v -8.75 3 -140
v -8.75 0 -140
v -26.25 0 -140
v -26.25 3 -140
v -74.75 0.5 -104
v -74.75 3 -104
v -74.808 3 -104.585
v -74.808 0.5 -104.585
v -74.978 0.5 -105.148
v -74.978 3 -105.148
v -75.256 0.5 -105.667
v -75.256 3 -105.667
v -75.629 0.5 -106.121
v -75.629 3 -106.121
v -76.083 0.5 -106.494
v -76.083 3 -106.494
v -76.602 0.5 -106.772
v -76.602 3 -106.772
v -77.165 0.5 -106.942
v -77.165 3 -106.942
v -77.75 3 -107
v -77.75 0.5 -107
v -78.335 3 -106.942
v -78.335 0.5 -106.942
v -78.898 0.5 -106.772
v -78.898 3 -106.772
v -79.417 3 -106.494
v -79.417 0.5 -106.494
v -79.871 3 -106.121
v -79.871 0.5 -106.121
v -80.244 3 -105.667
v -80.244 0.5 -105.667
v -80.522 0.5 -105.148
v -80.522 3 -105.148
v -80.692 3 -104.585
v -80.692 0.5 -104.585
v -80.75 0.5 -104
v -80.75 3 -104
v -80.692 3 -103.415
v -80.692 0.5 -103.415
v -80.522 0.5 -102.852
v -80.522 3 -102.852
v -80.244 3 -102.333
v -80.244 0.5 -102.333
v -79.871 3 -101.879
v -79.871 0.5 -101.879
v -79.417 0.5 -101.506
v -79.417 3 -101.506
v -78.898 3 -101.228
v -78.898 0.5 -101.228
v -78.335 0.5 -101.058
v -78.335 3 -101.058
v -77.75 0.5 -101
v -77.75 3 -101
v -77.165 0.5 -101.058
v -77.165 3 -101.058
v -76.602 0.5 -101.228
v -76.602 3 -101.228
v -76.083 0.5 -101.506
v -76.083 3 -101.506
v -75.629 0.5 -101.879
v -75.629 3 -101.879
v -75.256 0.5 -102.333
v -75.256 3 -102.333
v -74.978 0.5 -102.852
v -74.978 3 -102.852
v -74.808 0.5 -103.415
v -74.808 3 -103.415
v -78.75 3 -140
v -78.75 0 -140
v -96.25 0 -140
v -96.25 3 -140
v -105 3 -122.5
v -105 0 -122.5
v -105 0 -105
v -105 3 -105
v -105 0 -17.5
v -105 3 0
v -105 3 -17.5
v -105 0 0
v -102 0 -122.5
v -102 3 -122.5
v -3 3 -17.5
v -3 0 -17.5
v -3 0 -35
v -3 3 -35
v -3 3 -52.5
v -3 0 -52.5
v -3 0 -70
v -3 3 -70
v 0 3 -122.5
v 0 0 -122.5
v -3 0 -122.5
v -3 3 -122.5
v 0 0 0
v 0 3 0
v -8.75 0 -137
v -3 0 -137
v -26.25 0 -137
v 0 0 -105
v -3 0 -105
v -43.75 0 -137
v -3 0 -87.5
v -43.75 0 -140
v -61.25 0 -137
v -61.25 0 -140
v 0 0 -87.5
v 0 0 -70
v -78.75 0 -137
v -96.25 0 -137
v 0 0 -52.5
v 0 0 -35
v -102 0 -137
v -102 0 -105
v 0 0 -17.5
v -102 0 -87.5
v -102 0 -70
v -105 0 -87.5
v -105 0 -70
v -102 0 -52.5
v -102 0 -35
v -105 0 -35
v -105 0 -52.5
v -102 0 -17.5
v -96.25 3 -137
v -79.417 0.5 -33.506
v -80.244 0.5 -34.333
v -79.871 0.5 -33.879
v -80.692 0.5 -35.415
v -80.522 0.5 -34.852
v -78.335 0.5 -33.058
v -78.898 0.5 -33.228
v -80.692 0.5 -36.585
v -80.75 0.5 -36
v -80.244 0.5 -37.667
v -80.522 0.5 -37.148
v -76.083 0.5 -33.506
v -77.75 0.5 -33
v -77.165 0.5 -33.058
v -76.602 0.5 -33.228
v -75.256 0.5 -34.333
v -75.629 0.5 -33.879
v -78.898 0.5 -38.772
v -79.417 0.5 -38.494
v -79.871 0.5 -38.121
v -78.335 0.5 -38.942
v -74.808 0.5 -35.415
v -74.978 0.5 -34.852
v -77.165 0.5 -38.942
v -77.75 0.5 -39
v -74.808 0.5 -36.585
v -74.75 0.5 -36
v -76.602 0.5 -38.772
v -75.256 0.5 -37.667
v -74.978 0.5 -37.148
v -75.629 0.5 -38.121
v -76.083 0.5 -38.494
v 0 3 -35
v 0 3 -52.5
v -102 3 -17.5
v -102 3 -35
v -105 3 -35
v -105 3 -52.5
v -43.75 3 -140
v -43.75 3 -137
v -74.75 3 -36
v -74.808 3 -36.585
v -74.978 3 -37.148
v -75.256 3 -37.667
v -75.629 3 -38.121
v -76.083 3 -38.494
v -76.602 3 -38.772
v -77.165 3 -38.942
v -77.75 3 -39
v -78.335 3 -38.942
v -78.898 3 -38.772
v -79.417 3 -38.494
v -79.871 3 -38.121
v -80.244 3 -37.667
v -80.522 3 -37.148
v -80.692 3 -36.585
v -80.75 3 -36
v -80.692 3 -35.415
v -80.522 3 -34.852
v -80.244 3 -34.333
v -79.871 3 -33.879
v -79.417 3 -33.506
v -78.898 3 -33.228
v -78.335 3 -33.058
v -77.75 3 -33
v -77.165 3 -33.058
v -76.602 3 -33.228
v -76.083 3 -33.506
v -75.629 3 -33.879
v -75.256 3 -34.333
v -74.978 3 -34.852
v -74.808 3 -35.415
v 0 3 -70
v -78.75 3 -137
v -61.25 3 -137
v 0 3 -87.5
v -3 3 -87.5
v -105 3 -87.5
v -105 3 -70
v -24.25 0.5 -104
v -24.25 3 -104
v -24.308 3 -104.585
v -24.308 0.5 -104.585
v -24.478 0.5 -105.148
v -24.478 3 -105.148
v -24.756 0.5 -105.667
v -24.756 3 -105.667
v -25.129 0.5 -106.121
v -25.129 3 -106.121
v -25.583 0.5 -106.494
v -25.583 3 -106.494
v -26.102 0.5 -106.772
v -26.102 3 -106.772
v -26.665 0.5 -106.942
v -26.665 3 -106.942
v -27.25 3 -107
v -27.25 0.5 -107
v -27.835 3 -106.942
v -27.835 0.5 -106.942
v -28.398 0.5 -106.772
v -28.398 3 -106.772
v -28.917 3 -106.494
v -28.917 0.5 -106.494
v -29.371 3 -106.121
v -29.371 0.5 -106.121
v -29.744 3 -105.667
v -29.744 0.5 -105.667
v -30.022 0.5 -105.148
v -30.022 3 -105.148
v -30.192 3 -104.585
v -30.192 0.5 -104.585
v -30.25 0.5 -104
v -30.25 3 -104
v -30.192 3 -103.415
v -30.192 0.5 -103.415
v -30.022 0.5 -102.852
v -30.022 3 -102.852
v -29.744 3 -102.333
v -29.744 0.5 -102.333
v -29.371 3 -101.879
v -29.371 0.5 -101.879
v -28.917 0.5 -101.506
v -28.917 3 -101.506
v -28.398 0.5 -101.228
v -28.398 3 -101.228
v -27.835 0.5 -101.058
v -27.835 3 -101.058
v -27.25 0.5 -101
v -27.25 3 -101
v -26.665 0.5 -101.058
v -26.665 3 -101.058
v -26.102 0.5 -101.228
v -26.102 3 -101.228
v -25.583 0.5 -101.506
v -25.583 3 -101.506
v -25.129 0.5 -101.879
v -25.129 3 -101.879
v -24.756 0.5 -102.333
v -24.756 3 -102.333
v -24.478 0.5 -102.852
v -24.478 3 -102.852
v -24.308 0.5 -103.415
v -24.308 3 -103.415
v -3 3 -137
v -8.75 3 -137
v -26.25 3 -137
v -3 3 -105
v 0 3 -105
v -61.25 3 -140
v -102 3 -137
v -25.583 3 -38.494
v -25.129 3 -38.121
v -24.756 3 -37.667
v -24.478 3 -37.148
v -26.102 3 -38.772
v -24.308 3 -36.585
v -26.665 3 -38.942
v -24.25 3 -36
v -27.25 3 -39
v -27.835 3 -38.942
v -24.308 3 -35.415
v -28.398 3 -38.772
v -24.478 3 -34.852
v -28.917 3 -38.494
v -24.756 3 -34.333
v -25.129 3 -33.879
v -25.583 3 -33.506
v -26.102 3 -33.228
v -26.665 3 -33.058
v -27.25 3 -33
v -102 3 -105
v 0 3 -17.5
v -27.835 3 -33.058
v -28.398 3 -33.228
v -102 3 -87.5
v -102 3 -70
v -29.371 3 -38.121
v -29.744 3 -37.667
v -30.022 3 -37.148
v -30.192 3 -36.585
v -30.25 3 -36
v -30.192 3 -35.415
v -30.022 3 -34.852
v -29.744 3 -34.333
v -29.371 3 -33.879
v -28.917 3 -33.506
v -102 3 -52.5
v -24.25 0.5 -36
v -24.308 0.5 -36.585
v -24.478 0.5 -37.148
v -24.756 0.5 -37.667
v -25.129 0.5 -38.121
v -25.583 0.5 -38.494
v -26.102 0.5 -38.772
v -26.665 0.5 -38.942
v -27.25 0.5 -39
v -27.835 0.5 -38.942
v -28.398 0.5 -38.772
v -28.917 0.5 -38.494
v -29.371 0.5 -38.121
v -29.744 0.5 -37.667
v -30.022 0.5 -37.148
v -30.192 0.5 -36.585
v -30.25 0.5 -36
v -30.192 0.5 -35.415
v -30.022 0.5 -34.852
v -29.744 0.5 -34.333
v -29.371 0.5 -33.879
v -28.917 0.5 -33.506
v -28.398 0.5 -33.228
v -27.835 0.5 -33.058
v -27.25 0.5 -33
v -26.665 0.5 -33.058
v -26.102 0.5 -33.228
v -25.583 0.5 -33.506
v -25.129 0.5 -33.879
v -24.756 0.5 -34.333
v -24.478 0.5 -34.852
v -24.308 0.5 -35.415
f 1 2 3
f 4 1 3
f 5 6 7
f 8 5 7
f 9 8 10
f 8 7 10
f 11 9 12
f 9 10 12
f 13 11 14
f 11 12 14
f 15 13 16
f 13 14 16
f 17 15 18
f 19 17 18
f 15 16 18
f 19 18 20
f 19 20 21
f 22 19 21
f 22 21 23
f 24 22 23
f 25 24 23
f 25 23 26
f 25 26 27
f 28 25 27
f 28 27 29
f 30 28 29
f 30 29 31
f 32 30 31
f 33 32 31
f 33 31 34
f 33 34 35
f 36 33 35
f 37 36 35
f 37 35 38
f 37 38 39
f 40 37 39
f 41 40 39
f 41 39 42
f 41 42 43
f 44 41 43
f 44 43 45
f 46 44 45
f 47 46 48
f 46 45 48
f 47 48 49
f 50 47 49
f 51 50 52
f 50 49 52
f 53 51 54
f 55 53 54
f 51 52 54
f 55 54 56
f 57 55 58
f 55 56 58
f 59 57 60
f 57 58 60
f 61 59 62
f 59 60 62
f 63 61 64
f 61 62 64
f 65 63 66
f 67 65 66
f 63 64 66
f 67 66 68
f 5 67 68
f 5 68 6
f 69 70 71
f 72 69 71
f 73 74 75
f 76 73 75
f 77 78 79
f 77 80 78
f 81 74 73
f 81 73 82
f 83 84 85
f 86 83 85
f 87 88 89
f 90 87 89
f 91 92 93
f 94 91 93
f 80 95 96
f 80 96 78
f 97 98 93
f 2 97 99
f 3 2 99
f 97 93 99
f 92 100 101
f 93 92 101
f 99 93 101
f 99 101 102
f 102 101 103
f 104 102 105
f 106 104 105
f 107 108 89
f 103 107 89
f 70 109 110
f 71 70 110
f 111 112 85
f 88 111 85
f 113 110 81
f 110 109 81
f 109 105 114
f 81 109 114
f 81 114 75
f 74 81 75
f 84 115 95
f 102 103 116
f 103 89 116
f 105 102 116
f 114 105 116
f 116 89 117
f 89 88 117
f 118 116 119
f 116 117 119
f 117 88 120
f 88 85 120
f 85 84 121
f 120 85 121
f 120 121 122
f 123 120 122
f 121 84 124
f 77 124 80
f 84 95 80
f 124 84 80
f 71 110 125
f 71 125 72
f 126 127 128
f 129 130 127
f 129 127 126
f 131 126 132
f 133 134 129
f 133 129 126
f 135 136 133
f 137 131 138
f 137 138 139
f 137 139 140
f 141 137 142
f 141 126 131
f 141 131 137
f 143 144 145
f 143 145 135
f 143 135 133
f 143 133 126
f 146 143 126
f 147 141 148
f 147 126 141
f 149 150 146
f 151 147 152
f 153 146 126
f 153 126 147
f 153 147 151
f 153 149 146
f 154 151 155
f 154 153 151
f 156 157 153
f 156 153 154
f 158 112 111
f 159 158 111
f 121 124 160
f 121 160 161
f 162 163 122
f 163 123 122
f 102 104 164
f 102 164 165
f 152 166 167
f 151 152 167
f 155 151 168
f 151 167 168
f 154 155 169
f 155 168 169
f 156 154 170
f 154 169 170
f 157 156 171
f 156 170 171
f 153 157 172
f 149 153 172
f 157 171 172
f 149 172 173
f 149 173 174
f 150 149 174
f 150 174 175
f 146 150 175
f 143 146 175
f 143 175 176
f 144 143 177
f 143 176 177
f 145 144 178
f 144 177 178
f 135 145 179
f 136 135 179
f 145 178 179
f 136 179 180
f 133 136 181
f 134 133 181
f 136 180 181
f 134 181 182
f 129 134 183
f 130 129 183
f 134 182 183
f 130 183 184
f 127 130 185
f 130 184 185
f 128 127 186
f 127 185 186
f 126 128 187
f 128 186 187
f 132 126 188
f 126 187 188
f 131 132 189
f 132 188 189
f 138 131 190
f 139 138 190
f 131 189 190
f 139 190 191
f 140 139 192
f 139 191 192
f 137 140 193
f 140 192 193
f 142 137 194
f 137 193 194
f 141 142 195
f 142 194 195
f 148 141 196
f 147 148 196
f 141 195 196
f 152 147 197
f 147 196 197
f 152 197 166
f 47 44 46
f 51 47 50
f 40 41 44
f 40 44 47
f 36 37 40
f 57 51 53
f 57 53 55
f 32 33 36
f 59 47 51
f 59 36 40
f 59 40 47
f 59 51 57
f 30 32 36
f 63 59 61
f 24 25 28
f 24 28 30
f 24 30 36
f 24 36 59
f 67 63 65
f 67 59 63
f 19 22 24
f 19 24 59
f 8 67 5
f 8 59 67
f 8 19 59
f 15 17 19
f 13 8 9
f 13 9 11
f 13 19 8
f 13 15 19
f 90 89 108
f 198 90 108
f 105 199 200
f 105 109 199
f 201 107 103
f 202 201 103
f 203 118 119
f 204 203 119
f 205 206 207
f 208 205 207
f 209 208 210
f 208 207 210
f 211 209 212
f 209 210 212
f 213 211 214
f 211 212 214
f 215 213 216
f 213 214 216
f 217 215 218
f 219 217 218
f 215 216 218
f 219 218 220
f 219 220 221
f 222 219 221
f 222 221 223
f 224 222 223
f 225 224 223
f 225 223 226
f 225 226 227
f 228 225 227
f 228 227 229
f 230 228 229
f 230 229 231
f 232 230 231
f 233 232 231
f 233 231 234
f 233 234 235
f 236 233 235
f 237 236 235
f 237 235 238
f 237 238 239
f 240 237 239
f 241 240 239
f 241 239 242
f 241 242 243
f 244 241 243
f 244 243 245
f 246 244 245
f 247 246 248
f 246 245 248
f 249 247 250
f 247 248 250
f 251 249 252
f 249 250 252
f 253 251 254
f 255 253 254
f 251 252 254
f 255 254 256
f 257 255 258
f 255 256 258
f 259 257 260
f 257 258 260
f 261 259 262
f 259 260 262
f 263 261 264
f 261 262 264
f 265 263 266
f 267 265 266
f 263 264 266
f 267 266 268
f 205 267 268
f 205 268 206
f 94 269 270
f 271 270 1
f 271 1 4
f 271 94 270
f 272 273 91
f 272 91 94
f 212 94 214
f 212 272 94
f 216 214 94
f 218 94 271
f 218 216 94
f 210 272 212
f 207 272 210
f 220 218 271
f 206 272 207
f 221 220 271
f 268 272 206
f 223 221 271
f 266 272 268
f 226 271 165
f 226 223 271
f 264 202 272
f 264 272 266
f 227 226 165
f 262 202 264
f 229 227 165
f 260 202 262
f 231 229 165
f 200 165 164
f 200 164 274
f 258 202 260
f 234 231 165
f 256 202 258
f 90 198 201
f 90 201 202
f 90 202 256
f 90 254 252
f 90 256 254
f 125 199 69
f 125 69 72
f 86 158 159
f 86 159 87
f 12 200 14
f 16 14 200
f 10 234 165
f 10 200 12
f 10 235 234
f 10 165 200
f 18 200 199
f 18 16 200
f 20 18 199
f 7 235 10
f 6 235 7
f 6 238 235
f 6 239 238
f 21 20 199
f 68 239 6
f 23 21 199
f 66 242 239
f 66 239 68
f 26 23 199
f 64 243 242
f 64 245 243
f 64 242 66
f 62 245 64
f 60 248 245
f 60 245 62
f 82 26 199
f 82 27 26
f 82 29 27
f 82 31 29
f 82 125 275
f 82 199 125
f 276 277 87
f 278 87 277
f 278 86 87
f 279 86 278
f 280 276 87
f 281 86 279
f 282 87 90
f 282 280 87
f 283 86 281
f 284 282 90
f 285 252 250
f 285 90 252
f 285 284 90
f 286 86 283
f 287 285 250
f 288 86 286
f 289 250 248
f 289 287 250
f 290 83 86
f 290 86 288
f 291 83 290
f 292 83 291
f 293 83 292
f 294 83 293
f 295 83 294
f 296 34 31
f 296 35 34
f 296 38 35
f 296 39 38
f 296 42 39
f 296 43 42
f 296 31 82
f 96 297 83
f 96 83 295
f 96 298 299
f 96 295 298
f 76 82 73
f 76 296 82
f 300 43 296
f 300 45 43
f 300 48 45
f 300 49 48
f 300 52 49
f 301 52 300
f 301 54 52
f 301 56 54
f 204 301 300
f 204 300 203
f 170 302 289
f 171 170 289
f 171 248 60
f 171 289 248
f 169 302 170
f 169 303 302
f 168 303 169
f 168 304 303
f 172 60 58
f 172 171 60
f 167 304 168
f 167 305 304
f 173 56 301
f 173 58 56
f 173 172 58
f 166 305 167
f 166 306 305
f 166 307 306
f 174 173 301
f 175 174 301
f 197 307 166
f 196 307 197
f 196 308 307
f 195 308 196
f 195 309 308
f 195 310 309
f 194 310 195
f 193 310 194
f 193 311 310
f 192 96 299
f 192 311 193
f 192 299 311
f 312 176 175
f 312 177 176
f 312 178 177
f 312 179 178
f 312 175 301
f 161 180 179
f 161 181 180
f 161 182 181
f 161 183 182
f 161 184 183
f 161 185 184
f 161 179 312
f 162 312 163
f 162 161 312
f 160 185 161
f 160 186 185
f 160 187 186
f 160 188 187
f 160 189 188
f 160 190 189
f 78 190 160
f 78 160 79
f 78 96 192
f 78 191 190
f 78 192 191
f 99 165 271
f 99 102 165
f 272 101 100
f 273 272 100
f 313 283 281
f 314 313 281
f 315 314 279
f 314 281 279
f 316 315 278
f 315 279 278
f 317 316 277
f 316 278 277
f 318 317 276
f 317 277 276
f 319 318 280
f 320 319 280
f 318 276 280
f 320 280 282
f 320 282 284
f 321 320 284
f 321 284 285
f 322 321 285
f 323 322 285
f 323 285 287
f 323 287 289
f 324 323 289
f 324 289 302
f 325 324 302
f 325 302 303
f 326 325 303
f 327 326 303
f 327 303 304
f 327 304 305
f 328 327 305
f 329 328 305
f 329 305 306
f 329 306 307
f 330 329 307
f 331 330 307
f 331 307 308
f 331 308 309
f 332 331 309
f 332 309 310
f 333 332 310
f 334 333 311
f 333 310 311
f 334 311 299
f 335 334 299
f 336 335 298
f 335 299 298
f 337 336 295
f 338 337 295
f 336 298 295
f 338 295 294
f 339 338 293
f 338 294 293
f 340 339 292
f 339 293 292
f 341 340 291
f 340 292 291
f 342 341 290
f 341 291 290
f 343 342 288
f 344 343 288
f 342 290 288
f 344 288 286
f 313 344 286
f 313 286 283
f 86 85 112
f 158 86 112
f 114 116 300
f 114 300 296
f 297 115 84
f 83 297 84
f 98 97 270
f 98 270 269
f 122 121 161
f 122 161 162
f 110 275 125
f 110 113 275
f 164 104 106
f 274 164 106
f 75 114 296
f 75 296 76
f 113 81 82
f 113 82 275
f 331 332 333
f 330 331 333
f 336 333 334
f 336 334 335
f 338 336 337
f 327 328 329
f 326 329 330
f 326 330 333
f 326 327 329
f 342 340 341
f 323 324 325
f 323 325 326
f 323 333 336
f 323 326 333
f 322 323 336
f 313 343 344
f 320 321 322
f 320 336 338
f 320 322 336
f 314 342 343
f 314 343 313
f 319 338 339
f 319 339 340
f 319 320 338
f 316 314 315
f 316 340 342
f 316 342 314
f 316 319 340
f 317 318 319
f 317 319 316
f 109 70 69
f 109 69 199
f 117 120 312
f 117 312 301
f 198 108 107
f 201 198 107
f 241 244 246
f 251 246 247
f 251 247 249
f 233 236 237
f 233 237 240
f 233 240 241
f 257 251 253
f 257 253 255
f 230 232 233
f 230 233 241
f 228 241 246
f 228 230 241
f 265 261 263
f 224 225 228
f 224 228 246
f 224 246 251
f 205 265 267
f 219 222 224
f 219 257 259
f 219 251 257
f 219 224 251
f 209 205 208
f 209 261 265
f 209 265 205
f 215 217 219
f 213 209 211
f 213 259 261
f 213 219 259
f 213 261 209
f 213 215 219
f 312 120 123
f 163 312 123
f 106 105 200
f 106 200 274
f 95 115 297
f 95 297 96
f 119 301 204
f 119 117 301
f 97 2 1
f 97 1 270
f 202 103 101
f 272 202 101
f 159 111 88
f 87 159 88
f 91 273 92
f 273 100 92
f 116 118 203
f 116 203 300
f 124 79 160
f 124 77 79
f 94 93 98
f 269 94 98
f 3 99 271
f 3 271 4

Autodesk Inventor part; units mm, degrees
ref_plane "YZ Plane" through (0, 0, 0) normal (1, 0, 0) x (0, 1, 0)
ref_plane "XZ Plane" through (0, 0, 0) normal (0, 1, 0) x (-1, 0, 0)
ref_plane "XY Plane" through (0, 0, 0) normal (0, 0, 1) x (1, 0, 0)
sketch "Sketch2" plane through (0, 0, 0) normal (0, 1, 0) x (-1, 0, 0)
  line L0 (0, 0) -> (105, 0)
  line L1 (105, 0) -> (105, -140)
  line L2 (105, -140) -> (0, -140)
  line L3 (0, -140) -> (0, 0)
  point P0 (75, -100)
  dimension "d4" = 105
  dimension "d5" = 140
extrude "Extrusion2" add sketch "Sketch2" along normal blind 3
sketch "Sketch3" plane through (0, 0, 0) normal (0, -1, 0) x (1, 0, 0)
  line L0 (-105, 0) -> (0, 0) projected
  line L1 (-105, -140) -> (-105, 0) projected
  line L2 (0, -17.5) -> (-3, -17.5)
  line L3 (-3, -17.5) -> (-3, -35)
  line L4 (-3, -35) -> (0, -35)
  line L5 (0, -35) -> (0, -52.5)
  line L6 (0, -52.5) -> (-3, -52.5)
  line L7 (-3, -52.5) -> (-3, -70)
  line L8 (-3, -70) -> (0, -70)
  line L9 (0, -70) -> (0, -87.5)
  line L10 (0, -87.5) -> (-3, -87.5)
  line L11 (-3, -87.5) -> (-3, -105)
  line L12 (-3, -105) -> (0, -105)
  line L13 (0, -105) -> (0, -122.5)
  line L14 (0, -122.5) -> (-3, -122.5)
  line L15 (-3, -122.5) -> (-3, -140)
  line L16 (0, -17.5) -> (0, 0)
  line L17 (-105, 0) -> (0, 0) projected
  line L18 (-105, -140) -> (-105, 0) projected
  line L19 (0, 0) -> (-105, 0)
  line L20 (-105, 0) -> (-105, -17.5)
  line L21 (-105, -17.5) -> (-102, -17.5)
  line L22 (-102, -17.5) -> (-102, -35)
  line L23 (-102, -35) -> (-105, -35)
  line L24 (-105, -35) -> (-105, -52.5)
  line L25 (-102, -52.5) -> (-105, -52.5)
  line L26 (-102, -52.5) -> (-102, -70)
  line L27 (-102, -70) -> (-105, -70)
  line L28 (-105, -70) -> (-105, -87.5)
  line L29 (-105, -87.5) -> (-102, -87.5)
  line L30 (-102, -87.5) -> (-102, -105)
  line L31 (-102, -105) -> (-105, -105)
  line L32 (-105, -105) -> (-105, -122.5)
  line L33 (-105, -122.5) -> (-102, -122.5)
  line L34 (-102, -122.5) -> (-102, -137)
  line L35 (0, -140) -> (-105, -140) projected
  line L36 (-105, -122.5) -> (-105, -105)
  line L37 (-102, -137) -> (-96.25, -137)
  line L38 (-96.25, -137) -> (-96.25, -140)
  line L39 (-96.25, -140) -> (-78.75, -140)
  line L40 (-52.5, -140) -> (-35, -140)
  line L41 (-17.5, -140) -> (-3, -140)
  line L42 (-3, -140) -> (-3, -137)
  line L43 (-61.25, -140) -> (-43.75, -140)
  line L44 (-43.75, -140) -> (-43.75, -137)
  line L45 (-43.75, -137) -> (-26.25, -137)
  line L46 (-26.25, -137) -> (-26.25, -140)
  line L47 (-26.25, -140) -> (-8.75, -140)
  line L48 (-8.75, -140) -> (-8.75, -137)
  line L49 (-8.75, -137) -> (-3, -137)
  line L50 (-96.25, -137) -> (-96.25, -140)
  line L51 (-96.25, -140) -> (-78.75, -140)
  line L52 (-78.75, -140) -> (-78.75, -137)
  line L53 (-78.75, -137) -> (-61.25, -137)
  line L54 (-61.25, -137) -> (-61.25, -140)
  line L55 (-61.25, -140) -> (-43.75, -140)
  line L56 (-26.25, -140) -> (-8.75, -140)
  point P0 (-17.5, -137)
  dimension "d51" = 3
  dimension "d52" = 17.5
  dimension "d53" = 17.5
  dimension "d54" = 17.5
  dimension "d55" = 17.5
  dimension "d56" = 17.5
  dimension "d58" = 3
  dimension "d65" = 17.5
  dimension "d66" = 17.5
  dimension "d67" = 17.5
  dimension "d69" = 5.75
  dimension "d70" = 5.75
  dimension "d71" = 17.5
extrude "Extrusion3" cut sketch "Sketch3" against normal blind 3 contours L0 L16 L2 L3 L4 L5 L6 L7 L8 L9 L10 L11 L12 L13 L14 L15 L49 L48 L35 L46 L45 L44 L54 L53 L52 L38 L37 L34 L33 L1 L31 L30 L29 L27 L26 L25 L23 L22 L21 keep common part
sketch "Sketch5" plane through (0, 3, 0) normal (0, 1, 0) x (1, 0, 0)
  circle A0 centre (-27.25, 36) radius 3
  line L0 (0, 0) -> (0, 17.5) projected
  line L1 (0, 0) -> (0, 17.5)
  line L2 (-105, 0) -> (0, 0) projected
  line L3 (0, 0) -> (-17.5, 0)
  circle A1 centre (-77.75, 36) radius 3
  circle A2 centre (-27.25, 104) radius 3
  circle A3 centre (-77.75, 104) radius 3
  line L4 (-3, 122.5) -> (-3, 137) projected
  line L5 (-26.25, 137) -> (-43.75, 137) projected
  line L6 (0, 105) -> (0, 122.5) projected
  line L7 (-8.75, 140) -> (-26.25, 140) projected
  dimension "d72" = 17.5
  dimension "d75" = 50.5
  dimension "d78" = 68
  dimension "d81" = 6
  dimension "d84" = 27.25
  dimension "d85" = 36
extrude "Extrusion4" cut sketch "Sketch5" against normal blind 2.5
properties part number "TableBottom" material "Wood (Cherry)"
